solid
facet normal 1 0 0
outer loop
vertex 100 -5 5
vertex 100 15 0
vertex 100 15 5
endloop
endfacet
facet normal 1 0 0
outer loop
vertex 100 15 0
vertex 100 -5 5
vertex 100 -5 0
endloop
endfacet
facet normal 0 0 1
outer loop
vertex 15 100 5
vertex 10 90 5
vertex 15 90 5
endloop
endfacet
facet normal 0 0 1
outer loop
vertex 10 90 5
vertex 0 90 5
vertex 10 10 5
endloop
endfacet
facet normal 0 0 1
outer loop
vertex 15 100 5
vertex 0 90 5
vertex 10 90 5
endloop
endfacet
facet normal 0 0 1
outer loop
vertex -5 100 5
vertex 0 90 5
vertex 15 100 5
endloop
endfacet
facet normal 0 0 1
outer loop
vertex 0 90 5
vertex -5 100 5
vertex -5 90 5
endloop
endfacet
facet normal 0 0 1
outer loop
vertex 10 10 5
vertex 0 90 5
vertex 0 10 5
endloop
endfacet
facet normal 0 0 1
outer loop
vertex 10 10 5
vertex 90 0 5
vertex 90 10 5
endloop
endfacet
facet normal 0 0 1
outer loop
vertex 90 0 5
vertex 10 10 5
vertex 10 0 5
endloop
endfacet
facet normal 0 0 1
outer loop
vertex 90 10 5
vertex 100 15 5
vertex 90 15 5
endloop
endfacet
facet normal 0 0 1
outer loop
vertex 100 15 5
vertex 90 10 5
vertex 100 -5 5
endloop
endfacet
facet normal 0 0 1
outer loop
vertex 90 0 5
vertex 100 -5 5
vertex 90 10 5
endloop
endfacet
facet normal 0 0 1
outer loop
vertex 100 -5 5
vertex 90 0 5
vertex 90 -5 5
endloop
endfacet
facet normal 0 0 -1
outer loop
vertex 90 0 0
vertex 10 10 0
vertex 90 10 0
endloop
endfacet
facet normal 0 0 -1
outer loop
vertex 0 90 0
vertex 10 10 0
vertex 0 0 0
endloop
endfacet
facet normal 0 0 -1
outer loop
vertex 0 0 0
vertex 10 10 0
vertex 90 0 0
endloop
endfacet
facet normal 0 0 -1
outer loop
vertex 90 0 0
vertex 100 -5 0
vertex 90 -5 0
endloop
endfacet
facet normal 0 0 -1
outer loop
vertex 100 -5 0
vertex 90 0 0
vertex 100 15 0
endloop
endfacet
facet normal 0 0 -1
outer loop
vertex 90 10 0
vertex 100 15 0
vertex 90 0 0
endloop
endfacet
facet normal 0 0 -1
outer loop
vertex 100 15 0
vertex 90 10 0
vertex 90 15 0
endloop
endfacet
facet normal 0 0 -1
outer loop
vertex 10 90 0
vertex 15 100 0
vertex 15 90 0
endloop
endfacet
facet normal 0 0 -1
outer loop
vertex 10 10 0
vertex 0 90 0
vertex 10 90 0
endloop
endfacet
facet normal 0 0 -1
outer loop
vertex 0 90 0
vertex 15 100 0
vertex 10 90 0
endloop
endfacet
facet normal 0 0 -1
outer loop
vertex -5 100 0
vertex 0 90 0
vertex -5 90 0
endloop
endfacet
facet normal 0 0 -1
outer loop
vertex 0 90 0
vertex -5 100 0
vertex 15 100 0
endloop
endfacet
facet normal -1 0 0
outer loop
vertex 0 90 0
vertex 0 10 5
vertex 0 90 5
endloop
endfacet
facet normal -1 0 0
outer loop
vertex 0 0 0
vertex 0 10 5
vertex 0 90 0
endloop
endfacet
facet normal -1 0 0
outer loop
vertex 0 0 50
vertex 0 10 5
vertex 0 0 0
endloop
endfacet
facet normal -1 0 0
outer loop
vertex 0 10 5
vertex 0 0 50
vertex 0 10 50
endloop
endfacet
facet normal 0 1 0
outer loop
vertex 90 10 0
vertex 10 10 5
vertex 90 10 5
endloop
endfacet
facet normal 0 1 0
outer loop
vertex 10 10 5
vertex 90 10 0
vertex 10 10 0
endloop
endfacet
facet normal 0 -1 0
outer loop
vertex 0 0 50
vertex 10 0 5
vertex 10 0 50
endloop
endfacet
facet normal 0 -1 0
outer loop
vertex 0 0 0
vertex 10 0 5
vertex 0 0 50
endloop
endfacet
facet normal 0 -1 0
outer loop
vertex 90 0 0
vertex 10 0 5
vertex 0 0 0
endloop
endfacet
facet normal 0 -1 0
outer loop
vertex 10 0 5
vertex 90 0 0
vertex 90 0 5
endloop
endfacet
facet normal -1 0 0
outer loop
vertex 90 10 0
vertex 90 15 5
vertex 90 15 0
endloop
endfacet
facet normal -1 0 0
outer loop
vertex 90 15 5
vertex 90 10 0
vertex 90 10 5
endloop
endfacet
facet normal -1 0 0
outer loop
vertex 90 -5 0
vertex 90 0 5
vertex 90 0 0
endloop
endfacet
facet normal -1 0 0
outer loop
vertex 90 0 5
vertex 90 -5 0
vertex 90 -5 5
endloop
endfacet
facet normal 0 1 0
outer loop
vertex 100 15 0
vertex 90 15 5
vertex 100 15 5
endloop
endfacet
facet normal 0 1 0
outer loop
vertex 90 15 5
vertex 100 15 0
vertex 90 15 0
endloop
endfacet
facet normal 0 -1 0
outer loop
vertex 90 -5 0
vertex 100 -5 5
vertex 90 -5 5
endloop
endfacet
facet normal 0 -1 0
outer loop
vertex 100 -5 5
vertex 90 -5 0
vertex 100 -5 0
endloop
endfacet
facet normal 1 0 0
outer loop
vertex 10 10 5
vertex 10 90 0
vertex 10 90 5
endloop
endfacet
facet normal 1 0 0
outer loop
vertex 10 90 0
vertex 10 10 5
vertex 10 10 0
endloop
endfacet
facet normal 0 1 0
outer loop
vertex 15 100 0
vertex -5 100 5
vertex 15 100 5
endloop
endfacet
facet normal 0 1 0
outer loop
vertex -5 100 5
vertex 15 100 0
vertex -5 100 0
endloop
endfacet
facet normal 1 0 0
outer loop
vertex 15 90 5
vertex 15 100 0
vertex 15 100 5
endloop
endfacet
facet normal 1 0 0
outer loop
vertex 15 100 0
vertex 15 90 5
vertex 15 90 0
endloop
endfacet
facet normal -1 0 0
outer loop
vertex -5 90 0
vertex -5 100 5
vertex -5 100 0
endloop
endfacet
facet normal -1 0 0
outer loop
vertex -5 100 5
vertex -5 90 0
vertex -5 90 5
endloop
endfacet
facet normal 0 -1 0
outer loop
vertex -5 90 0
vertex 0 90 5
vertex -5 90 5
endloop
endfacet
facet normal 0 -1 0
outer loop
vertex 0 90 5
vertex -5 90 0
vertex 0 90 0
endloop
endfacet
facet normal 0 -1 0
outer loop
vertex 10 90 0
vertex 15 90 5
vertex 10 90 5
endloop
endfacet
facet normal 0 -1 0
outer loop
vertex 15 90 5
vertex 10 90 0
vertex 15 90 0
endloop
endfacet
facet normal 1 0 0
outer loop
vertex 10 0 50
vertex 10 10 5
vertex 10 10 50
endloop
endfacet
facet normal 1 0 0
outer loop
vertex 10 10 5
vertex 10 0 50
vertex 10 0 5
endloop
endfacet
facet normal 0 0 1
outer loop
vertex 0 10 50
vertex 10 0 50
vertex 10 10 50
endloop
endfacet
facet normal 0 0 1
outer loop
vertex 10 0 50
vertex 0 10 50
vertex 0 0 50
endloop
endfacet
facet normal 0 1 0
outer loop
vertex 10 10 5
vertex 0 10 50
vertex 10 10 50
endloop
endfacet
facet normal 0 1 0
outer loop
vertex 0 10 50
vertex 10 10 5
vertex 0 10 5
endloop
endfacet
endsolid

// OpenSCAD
cube([100,10,5]);
translate([90,-5,0]) cube([10,20,5]);
cube([10,100,5]);
translate([-5,90,0]) cube([20,10,5]);
cube([10,10,50]);
